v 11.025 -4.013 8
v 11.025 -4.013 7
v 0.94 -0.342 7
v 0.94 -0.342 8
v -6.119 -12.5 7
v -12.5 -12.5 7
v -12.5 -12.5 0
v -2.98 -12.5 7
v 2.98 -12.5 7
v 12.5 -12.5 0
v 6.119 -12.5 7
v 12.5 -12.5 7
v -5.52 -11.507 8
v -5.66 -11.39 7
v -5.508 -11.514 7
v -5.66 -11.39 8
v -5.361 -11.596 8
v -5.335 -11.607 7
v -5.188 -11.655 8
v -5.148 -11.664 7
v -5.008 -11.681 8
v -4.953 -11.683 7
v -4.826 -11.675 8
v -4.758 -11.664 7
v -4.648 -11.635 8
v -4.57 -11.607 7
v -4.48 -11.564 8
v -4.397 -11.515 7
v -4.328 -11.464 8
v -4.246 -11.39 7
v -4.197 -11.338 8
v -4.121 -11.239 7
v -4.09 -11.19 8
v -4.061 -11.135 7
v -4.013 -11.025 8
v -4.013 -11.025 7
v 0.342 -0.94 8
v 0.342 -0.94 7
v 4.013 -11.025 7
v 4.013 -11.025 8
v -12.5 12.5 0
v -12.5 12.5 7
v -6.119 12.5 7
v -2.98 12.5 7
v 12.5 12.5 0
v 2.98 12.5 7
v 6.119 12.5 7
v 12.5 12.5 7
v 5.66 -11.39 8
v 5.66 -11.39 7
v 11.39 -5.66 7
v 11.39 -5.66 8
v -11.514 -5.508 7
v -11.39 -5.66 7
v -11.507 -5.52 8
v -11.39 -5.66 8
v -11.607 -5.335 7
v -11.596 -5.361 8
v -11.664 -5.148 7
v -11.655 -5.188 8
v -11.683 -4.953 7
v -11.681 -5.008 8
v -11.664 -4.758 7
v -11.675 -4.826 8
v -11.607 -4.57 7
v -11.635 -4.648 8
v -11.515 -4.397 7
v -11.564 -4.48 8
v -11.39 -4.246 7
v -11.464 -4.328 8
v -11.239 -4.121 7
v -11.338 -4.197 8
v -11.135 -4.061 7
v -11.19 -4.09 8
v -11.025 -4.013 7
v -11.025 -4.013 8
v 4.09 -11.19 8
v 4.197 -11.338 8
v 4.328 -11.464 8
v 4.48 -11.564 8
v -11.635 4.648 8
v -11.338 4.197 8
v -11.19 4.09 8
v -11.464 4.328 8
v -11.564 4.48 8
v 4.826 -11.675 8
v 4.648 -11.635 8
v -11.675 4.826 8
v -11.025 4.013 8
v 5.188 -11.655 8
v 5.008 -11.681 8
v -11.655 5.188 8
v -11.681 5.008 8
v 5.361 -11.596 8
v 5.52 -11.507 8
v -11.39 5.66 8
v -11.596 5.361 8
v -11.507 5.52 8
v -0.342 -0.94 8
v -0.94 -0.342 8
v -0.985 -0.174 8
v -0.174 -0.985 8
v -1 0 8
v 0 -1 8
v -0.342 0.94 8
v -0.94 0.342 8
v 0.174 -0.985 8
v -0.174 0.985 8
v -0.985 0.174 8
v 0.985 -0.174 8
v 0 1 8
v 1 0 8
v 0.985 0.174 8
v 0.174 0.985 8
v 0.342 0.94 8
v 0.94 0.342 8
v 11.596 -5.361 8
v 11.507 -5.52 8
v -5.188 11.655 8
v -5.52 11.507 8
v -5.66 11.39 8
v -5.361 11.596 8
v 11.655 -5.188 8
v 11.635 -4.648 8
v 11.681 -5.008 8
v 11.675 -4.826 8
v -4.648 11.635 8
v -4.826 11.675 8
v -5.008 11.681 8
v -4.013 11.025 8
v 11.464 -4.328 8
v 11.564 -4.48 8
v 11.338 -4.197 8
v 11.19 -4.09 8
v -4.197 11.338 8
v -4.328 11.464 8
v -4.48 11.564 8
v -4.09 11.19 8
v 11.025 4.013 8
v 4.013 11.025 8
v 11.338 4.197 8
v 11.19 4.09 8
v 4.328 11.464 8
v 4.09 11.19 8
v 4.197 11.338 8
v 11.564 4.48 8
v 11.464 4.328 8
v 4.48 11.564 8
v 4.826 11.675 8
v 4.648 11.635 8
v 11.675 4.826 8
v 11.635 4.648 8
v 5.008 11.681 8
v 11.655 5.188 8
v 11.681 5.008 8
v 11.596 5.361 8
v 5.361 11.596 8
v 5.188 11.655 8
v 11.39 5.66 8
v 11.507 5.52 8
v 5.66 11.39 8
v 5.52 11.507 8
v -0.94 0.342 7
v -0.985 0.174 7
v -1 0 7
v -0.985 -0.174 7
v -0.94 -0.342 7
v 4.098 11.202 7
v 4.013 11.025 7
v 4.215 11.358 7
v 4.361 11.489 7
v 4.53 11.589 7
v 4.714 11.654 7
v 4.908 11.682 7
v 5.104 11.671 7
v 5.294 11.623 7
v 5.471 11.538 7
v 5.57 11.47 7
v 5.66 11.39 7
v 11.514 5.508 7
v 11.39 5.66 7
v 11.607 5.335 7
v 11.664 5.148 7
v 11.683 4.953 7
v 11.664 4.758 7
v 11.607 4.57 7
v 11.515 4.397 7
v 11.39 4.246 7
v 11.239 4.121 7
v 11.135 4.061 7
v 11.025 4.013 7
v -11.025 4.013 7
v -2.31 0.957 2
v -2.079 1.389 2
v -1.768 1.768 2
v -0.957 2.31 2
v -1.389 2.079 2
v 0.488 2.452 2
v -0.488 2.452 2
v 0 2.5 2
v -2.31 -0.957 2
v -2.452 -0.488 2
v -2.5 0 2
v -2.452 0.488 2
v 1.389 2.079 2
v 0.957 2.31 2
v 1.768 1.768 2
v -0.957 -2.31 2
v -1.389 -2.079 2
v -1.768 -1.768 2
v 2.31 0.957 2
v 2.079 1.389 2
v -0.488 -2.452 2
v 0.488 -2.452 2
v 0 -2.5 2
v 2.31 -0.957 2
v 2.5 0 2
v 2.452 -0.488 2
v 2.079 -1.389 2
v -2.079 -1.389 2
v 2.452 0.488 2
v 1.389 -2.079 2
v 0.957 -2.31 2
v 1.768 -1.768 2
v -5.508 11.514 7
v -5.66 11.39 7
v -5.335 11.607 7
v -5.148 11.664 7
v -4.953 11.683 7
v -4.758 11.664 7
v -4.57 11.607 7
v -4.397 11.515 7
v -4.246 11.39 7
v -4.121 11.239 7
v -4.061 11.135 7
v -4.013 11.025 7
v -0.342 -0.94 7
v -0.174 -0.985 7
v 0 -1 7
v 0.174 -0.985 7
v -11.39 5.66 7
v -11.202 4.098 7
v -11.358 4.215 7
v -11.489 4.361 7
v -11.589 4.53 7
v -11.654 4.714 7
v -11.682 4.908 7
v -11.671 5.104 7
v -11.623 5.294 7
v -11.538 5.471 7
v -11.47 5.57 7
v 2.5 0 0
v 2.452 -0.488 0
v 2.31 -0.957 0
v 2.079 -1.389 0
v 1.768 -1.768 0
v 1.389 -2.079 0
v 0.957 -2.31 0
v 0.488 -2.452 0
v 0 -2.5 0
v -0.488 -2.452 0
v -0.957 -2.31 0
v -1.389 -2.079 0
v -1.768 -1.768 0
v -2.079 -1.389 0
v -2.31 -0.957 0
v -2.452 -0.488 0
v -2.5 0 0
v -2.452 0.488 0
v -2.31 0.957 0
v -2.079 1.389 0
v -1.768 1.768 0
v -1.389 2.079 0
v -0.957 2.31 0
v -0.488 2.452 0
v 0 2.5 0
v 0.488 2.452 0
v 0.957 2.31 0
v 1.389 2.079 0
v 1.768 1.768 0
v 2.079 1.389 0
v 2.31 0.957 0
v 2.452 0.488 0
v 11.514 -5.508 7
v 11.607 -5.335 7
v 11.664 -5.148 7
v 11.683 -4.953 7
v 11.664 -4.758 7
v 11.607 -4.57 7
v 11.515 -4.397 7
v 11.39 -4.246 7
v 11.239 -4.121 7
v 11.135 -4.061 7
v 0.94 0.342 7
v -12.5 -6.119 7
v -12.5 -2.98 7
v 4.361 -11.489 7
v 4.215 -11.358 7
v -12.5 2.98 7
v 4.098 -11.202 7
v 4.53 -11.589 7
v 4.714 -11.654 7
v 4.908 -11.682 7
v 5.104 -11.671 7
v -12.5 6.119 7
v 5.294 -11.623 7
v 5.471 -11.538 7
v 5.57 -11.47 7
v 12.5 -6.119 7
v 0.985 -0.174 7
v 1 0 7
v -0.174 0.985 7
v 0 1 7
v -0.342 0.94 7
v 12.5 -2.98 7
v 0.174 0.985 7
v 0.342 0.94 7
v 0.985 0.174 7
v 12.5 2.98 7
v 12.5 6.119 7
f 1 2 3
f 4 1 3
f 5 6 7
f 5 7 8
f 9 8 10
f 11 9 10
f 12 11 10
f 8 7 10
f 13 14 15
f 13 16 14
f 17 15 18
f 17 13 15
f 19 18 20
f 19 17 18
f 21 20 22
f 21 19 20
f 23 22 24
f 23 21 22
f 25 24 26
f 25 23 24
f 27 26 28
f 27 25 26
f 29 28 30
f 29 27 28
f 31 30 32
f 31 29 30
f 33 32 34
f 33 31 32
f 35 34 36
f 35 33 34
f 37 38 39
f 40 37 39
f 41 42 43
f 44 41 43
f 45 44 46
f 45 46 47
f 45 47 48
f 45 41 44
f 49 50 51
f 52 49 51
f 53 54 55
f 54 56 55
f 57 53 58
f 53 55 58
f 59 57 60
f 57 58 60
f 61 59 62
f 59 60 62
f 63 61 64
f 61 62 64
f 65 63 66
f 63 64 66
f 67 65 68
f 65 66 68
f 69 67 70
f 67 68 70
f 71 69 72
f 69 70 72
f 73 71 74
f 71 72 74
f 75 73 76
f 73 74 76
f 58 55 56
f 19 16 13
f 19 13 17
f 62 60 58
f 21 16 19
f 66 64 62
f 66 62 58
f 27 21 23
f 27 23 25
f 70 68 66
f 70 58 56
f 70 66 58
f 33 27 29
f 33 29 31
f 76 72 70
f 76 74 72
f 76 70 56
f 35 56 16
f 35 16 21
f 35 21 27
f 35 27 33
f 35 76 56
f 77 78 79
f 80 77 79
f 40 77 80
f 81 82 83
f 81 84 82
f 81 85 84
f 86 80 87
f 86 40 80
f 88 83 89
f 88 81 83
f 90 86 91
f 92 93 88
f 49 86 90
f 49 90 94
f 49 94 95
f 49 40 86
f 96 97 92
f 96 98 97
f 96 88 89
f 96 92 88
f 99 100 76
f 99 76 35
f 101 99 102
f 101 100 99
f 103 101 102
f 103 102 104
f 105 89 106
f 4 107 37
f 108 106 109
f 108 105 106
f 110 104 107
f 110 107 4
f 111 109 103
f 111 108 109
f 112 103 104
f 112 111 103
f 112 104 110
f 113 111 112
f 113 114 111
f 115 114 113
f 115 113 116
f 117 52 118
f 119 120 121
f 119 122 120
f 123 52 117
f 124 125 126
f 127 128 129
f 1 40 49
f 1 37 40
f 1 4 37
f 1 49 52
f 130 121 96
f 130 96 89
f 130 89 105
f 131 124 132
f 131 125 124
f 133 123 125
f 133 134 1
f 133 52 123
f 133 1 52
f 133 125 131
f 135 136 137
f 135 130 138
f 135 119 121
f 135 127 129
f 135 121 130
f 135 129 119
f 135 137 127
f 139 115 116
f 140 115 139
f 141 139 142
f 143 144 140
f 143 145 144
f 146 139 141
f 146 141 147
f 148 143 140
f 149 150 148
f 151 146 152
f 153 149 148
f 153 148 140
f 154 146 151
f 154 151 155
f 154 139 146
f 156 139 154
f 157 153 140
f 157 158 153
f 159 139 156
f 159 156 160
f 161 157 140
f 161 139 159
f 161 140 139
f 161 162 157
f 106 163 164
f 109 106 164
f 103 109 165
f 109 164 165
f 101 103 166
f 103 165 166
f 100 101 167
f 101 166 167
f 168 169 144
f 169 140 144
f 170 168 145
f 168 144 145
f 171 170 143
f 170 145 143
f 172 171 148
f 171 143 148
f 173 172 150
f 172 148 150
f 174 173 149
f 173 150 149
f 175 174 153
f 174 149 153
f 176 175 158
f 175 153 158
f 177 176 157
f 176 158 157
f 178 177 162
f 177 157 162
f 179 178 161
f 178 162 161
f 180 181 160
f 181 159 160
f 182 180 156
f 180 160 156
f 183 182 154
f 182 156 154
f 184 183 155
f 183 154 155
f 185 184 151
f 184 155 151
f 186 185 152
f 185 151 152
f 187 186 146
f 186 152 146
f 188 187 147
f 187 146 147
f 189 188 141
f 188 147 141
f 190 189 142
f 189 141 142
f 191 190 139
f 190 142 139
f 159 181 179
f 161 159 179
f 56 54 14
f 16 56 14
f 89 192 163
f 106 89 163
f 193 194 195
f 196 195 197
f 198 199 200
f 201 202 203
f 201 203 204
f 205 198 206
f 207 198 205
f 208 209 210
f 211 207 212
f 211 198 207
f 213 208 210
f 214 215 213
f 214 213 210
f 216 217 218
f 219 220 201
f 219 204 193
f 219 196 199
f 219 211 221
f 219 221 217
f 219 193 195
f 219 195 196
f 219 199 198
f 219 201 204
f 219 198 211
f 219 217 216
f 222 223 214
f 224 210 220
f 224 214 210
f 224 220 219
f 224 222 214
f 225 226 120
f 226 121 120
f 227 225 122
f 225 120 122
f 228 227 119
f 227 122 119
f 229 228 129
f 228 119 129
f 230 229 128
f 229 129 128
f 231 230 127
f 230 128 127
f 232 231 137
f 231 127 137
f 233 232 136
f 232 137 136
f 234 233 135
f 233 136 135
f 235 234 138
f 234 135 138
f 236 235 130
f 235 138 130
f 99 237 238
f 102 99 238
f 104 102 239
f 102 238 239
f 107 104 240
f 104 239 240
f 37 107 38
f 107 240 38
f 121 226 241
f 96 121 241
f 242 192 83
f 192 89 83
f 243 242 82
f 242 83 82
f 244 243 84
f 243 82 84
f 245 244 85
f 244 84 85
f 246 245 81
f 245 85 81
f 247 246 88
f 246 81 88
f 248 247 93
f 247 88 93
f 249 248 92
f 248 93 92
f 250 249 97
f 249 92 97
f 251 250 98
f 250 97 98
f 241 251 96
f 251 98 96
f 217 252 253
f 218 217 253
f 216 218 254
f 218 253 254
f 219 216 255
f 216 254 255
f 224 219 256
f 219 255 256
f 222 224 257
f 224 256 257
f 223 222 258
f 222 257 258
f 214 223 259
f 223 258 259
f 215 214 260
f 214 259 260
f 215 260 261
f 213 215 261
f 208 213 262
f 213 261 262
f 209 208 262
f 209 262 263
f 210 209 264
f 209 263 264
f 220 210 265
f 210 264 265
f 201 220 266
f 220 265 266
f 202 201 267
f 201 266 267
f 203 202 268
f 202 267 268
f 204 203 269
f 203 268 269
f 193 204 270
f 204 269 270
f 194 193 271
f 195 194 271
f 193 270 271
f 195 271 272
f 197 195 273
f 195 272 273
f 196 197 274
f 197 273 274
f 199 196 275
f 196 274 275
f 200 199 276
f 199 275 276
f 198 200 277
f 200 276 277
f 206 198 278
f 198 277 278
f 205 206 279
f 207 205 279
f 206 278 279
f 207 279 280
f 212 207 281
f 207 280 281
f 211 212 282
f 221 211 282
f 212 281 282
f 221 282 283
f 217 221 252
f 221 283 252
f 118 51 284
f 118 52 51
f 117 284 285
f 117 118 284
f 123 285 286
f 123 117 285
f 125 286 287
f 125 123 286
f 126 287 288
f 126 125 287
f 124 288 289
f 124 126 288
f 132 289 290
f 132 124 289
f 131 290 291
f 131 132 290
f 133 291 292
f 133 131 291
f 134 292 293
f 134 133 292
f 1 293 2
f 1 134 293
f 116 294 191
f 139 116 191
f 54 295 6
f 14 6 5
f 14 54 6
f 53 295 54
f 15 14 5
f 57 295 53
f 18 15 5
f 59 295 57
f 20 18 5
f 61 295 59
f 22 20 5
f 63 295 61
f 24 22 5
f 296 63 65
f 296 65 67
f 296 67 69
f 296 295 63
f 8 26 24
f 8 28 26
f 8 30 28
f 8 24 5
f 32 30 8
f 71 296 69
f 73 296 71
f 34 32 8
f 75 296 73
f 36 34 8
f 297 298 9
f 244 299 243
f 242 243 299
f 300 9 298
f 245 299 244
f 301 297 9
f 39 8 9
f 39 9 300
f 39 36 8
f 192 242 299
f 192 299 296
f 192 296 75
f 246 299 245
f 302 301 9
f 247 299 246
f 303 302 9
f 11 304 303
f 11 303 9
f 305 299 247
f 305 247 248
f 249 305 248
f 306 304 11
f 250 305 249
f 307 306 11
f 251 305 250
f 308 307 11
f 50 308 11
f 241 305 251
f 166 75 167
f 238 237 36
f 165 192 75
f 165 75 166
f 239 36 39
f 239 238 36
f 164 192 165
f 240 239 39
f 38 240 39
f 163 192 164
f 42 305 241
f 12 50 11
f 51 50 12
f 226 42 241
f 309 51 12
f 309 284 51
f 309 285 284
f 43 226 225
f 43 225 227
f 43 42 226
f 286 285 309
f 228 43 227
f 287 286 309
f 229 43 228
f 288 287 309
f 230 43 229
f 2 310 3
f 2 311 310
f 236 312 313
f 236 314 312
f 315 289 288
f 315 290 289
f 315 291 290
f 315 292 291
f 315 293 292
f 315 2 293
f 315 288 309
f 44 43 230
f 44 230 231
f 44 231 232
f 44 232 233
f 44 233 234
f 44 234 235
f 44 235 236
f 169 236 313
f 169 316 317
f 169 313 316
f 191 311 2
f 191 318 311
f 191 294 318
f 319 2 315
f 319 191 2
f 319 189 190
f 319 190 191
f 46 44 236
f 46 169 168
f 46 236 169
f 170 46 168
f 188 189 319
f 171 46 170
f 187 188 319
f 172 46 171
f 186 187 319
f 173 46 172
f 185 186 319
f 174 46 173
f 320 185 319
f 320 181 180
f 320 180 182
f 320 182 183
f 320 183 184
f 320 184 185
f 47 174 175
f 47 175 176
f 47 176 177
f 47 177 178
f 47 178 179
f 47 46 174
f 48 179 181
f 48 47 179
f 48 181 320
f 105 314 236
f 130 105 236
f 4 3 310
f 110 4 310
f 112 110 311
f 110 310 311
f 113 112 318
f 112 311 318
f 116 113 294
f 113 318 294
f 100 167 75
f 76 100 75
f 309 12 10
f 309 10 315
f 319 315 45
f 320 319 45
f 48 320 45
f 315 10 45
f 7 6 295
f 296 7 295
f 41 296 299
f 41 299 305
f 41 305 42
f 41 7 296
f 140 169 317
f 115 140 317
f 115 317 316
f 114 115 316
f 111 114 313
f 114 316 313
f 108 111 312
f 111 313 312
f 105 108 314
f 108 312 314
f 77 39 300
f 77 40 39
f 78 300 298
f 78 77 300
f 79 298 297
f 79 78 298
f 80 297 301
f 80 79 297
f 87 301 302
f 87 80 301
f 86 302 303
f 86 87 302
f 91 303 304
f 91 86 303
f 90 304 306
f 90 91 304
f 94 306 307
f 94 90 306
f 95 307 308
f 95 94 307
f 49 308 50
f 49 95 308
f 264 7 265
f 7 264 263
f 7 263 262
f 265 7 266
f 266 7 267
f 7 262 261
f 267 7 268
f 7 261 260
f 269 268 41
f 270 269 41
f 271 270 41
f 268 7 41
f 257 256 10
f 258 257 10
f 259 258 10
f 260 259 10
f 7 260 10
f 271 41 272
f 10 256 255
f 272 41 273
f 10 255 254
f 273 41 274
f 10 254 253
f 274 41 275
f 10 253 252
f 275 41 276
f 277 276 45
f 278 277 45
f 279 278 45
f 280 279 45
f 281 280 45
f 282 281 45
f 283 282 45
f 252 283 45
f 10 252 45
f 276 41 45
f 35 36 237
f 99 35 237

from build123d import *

# Parameters (mm, degrees)
F0_W     = 25
F0_H     = 25
F1_DEPTH = 7
F2_R     = 2.5
F3_DEPTH = 2
F5_DEPTH = 1
F6_R     = 1


with BuildPart() as f1:
    # F0 (on Top) → F1 (new body)
    with BuildSketch(Plane.XY):
        Rectangle(F0_W, F0_H)
    extrude(amount=F1_DEPTH)

    # F2 (on face) → F3 (cut)
    with BuildSketch(Plane(origin=(0, 0, 0), x_dir=(1, 0, 0), z_dir=(0, 0, -1))):
        Circle(F2_R)
    extrude(amount=-F3_DEPTH, mode=Mode.SUBTRACT)

    # F4 (on face) → F5 (join)
    with BuildSketch(Plane.XY.offset(7)):
        with BuildLine():
            Line((-12.5, 4.5496279283), (-0.9396926208, 0.3420201433))
            ThreePointArc((-0.9396926208, 0.3420201433), (-1, 0), (-0.9396926208, -0.3420201433))
            Line((-0.9396926208, -0.3420201433), (-12.5, -4.5496279283))
            Line((-12.5, -4.5496279283), (-4.5496279283, -12.5))
            Line((-4.5496279283, -12.5), (-0.3420201433, -0.9396926208))
            ThreePointArc((-0.3420201433, -0.9396926208), (0, -1), (0.3420201433, -0.9396926208))
            Line((0.3420201433, -0.9396926208), (4.5496279283, -12.5))
            Line((4.5496279283, -12.5), (12.5, -4.5496279283))
            Line((12.5, -4.5496279283), (0.9396926208, -0.3420201433))
            ThreePointArc((0.9396926208, -0.3420201433), (1, 0), (0.9396926208, 0.3420201433))
            Line((0.9396926208, 0.3420201433), (12.5, 4.5496279283))
            Line((12.5, 4.5496279283), (4.5496279283, 12.5))
            Line((4.5496279283, 12.5), (0.3420201433, 0.9396926208))
            ThreePointArc((0.3420201433, 0.9396926208), (0, 1), (-0.3420201433, 0.9396926208))
            Line((-0.3420201433, 0.9396926208), (-4.5496279283, 12.5))
            Line((-4.5496279283, 12.5), (-12.5, 4.5496279283))
        make_face()
    extrude(amount=F5_DEPTH)

    # F6
    f6_edges = [f1.edges().sort_by_distance(p)[0] for p in [
        (-12.5, 4.549628, 7.5),
        (-4.549628, 12.5, 7.5),
        (4.549628, 12.5, 7.5),
        (12.5, 4.549628, 7.5),
        (4.549628, -12.5, 7.5),
        (12.5, -4.549628, 7.5),
        (-4.549628, -12.5, 7.5),
        (-12.5, -4.549628, 7.5),
    ]]
    fillet(f6_edges, radius=F6_R)


solid = f1.part
